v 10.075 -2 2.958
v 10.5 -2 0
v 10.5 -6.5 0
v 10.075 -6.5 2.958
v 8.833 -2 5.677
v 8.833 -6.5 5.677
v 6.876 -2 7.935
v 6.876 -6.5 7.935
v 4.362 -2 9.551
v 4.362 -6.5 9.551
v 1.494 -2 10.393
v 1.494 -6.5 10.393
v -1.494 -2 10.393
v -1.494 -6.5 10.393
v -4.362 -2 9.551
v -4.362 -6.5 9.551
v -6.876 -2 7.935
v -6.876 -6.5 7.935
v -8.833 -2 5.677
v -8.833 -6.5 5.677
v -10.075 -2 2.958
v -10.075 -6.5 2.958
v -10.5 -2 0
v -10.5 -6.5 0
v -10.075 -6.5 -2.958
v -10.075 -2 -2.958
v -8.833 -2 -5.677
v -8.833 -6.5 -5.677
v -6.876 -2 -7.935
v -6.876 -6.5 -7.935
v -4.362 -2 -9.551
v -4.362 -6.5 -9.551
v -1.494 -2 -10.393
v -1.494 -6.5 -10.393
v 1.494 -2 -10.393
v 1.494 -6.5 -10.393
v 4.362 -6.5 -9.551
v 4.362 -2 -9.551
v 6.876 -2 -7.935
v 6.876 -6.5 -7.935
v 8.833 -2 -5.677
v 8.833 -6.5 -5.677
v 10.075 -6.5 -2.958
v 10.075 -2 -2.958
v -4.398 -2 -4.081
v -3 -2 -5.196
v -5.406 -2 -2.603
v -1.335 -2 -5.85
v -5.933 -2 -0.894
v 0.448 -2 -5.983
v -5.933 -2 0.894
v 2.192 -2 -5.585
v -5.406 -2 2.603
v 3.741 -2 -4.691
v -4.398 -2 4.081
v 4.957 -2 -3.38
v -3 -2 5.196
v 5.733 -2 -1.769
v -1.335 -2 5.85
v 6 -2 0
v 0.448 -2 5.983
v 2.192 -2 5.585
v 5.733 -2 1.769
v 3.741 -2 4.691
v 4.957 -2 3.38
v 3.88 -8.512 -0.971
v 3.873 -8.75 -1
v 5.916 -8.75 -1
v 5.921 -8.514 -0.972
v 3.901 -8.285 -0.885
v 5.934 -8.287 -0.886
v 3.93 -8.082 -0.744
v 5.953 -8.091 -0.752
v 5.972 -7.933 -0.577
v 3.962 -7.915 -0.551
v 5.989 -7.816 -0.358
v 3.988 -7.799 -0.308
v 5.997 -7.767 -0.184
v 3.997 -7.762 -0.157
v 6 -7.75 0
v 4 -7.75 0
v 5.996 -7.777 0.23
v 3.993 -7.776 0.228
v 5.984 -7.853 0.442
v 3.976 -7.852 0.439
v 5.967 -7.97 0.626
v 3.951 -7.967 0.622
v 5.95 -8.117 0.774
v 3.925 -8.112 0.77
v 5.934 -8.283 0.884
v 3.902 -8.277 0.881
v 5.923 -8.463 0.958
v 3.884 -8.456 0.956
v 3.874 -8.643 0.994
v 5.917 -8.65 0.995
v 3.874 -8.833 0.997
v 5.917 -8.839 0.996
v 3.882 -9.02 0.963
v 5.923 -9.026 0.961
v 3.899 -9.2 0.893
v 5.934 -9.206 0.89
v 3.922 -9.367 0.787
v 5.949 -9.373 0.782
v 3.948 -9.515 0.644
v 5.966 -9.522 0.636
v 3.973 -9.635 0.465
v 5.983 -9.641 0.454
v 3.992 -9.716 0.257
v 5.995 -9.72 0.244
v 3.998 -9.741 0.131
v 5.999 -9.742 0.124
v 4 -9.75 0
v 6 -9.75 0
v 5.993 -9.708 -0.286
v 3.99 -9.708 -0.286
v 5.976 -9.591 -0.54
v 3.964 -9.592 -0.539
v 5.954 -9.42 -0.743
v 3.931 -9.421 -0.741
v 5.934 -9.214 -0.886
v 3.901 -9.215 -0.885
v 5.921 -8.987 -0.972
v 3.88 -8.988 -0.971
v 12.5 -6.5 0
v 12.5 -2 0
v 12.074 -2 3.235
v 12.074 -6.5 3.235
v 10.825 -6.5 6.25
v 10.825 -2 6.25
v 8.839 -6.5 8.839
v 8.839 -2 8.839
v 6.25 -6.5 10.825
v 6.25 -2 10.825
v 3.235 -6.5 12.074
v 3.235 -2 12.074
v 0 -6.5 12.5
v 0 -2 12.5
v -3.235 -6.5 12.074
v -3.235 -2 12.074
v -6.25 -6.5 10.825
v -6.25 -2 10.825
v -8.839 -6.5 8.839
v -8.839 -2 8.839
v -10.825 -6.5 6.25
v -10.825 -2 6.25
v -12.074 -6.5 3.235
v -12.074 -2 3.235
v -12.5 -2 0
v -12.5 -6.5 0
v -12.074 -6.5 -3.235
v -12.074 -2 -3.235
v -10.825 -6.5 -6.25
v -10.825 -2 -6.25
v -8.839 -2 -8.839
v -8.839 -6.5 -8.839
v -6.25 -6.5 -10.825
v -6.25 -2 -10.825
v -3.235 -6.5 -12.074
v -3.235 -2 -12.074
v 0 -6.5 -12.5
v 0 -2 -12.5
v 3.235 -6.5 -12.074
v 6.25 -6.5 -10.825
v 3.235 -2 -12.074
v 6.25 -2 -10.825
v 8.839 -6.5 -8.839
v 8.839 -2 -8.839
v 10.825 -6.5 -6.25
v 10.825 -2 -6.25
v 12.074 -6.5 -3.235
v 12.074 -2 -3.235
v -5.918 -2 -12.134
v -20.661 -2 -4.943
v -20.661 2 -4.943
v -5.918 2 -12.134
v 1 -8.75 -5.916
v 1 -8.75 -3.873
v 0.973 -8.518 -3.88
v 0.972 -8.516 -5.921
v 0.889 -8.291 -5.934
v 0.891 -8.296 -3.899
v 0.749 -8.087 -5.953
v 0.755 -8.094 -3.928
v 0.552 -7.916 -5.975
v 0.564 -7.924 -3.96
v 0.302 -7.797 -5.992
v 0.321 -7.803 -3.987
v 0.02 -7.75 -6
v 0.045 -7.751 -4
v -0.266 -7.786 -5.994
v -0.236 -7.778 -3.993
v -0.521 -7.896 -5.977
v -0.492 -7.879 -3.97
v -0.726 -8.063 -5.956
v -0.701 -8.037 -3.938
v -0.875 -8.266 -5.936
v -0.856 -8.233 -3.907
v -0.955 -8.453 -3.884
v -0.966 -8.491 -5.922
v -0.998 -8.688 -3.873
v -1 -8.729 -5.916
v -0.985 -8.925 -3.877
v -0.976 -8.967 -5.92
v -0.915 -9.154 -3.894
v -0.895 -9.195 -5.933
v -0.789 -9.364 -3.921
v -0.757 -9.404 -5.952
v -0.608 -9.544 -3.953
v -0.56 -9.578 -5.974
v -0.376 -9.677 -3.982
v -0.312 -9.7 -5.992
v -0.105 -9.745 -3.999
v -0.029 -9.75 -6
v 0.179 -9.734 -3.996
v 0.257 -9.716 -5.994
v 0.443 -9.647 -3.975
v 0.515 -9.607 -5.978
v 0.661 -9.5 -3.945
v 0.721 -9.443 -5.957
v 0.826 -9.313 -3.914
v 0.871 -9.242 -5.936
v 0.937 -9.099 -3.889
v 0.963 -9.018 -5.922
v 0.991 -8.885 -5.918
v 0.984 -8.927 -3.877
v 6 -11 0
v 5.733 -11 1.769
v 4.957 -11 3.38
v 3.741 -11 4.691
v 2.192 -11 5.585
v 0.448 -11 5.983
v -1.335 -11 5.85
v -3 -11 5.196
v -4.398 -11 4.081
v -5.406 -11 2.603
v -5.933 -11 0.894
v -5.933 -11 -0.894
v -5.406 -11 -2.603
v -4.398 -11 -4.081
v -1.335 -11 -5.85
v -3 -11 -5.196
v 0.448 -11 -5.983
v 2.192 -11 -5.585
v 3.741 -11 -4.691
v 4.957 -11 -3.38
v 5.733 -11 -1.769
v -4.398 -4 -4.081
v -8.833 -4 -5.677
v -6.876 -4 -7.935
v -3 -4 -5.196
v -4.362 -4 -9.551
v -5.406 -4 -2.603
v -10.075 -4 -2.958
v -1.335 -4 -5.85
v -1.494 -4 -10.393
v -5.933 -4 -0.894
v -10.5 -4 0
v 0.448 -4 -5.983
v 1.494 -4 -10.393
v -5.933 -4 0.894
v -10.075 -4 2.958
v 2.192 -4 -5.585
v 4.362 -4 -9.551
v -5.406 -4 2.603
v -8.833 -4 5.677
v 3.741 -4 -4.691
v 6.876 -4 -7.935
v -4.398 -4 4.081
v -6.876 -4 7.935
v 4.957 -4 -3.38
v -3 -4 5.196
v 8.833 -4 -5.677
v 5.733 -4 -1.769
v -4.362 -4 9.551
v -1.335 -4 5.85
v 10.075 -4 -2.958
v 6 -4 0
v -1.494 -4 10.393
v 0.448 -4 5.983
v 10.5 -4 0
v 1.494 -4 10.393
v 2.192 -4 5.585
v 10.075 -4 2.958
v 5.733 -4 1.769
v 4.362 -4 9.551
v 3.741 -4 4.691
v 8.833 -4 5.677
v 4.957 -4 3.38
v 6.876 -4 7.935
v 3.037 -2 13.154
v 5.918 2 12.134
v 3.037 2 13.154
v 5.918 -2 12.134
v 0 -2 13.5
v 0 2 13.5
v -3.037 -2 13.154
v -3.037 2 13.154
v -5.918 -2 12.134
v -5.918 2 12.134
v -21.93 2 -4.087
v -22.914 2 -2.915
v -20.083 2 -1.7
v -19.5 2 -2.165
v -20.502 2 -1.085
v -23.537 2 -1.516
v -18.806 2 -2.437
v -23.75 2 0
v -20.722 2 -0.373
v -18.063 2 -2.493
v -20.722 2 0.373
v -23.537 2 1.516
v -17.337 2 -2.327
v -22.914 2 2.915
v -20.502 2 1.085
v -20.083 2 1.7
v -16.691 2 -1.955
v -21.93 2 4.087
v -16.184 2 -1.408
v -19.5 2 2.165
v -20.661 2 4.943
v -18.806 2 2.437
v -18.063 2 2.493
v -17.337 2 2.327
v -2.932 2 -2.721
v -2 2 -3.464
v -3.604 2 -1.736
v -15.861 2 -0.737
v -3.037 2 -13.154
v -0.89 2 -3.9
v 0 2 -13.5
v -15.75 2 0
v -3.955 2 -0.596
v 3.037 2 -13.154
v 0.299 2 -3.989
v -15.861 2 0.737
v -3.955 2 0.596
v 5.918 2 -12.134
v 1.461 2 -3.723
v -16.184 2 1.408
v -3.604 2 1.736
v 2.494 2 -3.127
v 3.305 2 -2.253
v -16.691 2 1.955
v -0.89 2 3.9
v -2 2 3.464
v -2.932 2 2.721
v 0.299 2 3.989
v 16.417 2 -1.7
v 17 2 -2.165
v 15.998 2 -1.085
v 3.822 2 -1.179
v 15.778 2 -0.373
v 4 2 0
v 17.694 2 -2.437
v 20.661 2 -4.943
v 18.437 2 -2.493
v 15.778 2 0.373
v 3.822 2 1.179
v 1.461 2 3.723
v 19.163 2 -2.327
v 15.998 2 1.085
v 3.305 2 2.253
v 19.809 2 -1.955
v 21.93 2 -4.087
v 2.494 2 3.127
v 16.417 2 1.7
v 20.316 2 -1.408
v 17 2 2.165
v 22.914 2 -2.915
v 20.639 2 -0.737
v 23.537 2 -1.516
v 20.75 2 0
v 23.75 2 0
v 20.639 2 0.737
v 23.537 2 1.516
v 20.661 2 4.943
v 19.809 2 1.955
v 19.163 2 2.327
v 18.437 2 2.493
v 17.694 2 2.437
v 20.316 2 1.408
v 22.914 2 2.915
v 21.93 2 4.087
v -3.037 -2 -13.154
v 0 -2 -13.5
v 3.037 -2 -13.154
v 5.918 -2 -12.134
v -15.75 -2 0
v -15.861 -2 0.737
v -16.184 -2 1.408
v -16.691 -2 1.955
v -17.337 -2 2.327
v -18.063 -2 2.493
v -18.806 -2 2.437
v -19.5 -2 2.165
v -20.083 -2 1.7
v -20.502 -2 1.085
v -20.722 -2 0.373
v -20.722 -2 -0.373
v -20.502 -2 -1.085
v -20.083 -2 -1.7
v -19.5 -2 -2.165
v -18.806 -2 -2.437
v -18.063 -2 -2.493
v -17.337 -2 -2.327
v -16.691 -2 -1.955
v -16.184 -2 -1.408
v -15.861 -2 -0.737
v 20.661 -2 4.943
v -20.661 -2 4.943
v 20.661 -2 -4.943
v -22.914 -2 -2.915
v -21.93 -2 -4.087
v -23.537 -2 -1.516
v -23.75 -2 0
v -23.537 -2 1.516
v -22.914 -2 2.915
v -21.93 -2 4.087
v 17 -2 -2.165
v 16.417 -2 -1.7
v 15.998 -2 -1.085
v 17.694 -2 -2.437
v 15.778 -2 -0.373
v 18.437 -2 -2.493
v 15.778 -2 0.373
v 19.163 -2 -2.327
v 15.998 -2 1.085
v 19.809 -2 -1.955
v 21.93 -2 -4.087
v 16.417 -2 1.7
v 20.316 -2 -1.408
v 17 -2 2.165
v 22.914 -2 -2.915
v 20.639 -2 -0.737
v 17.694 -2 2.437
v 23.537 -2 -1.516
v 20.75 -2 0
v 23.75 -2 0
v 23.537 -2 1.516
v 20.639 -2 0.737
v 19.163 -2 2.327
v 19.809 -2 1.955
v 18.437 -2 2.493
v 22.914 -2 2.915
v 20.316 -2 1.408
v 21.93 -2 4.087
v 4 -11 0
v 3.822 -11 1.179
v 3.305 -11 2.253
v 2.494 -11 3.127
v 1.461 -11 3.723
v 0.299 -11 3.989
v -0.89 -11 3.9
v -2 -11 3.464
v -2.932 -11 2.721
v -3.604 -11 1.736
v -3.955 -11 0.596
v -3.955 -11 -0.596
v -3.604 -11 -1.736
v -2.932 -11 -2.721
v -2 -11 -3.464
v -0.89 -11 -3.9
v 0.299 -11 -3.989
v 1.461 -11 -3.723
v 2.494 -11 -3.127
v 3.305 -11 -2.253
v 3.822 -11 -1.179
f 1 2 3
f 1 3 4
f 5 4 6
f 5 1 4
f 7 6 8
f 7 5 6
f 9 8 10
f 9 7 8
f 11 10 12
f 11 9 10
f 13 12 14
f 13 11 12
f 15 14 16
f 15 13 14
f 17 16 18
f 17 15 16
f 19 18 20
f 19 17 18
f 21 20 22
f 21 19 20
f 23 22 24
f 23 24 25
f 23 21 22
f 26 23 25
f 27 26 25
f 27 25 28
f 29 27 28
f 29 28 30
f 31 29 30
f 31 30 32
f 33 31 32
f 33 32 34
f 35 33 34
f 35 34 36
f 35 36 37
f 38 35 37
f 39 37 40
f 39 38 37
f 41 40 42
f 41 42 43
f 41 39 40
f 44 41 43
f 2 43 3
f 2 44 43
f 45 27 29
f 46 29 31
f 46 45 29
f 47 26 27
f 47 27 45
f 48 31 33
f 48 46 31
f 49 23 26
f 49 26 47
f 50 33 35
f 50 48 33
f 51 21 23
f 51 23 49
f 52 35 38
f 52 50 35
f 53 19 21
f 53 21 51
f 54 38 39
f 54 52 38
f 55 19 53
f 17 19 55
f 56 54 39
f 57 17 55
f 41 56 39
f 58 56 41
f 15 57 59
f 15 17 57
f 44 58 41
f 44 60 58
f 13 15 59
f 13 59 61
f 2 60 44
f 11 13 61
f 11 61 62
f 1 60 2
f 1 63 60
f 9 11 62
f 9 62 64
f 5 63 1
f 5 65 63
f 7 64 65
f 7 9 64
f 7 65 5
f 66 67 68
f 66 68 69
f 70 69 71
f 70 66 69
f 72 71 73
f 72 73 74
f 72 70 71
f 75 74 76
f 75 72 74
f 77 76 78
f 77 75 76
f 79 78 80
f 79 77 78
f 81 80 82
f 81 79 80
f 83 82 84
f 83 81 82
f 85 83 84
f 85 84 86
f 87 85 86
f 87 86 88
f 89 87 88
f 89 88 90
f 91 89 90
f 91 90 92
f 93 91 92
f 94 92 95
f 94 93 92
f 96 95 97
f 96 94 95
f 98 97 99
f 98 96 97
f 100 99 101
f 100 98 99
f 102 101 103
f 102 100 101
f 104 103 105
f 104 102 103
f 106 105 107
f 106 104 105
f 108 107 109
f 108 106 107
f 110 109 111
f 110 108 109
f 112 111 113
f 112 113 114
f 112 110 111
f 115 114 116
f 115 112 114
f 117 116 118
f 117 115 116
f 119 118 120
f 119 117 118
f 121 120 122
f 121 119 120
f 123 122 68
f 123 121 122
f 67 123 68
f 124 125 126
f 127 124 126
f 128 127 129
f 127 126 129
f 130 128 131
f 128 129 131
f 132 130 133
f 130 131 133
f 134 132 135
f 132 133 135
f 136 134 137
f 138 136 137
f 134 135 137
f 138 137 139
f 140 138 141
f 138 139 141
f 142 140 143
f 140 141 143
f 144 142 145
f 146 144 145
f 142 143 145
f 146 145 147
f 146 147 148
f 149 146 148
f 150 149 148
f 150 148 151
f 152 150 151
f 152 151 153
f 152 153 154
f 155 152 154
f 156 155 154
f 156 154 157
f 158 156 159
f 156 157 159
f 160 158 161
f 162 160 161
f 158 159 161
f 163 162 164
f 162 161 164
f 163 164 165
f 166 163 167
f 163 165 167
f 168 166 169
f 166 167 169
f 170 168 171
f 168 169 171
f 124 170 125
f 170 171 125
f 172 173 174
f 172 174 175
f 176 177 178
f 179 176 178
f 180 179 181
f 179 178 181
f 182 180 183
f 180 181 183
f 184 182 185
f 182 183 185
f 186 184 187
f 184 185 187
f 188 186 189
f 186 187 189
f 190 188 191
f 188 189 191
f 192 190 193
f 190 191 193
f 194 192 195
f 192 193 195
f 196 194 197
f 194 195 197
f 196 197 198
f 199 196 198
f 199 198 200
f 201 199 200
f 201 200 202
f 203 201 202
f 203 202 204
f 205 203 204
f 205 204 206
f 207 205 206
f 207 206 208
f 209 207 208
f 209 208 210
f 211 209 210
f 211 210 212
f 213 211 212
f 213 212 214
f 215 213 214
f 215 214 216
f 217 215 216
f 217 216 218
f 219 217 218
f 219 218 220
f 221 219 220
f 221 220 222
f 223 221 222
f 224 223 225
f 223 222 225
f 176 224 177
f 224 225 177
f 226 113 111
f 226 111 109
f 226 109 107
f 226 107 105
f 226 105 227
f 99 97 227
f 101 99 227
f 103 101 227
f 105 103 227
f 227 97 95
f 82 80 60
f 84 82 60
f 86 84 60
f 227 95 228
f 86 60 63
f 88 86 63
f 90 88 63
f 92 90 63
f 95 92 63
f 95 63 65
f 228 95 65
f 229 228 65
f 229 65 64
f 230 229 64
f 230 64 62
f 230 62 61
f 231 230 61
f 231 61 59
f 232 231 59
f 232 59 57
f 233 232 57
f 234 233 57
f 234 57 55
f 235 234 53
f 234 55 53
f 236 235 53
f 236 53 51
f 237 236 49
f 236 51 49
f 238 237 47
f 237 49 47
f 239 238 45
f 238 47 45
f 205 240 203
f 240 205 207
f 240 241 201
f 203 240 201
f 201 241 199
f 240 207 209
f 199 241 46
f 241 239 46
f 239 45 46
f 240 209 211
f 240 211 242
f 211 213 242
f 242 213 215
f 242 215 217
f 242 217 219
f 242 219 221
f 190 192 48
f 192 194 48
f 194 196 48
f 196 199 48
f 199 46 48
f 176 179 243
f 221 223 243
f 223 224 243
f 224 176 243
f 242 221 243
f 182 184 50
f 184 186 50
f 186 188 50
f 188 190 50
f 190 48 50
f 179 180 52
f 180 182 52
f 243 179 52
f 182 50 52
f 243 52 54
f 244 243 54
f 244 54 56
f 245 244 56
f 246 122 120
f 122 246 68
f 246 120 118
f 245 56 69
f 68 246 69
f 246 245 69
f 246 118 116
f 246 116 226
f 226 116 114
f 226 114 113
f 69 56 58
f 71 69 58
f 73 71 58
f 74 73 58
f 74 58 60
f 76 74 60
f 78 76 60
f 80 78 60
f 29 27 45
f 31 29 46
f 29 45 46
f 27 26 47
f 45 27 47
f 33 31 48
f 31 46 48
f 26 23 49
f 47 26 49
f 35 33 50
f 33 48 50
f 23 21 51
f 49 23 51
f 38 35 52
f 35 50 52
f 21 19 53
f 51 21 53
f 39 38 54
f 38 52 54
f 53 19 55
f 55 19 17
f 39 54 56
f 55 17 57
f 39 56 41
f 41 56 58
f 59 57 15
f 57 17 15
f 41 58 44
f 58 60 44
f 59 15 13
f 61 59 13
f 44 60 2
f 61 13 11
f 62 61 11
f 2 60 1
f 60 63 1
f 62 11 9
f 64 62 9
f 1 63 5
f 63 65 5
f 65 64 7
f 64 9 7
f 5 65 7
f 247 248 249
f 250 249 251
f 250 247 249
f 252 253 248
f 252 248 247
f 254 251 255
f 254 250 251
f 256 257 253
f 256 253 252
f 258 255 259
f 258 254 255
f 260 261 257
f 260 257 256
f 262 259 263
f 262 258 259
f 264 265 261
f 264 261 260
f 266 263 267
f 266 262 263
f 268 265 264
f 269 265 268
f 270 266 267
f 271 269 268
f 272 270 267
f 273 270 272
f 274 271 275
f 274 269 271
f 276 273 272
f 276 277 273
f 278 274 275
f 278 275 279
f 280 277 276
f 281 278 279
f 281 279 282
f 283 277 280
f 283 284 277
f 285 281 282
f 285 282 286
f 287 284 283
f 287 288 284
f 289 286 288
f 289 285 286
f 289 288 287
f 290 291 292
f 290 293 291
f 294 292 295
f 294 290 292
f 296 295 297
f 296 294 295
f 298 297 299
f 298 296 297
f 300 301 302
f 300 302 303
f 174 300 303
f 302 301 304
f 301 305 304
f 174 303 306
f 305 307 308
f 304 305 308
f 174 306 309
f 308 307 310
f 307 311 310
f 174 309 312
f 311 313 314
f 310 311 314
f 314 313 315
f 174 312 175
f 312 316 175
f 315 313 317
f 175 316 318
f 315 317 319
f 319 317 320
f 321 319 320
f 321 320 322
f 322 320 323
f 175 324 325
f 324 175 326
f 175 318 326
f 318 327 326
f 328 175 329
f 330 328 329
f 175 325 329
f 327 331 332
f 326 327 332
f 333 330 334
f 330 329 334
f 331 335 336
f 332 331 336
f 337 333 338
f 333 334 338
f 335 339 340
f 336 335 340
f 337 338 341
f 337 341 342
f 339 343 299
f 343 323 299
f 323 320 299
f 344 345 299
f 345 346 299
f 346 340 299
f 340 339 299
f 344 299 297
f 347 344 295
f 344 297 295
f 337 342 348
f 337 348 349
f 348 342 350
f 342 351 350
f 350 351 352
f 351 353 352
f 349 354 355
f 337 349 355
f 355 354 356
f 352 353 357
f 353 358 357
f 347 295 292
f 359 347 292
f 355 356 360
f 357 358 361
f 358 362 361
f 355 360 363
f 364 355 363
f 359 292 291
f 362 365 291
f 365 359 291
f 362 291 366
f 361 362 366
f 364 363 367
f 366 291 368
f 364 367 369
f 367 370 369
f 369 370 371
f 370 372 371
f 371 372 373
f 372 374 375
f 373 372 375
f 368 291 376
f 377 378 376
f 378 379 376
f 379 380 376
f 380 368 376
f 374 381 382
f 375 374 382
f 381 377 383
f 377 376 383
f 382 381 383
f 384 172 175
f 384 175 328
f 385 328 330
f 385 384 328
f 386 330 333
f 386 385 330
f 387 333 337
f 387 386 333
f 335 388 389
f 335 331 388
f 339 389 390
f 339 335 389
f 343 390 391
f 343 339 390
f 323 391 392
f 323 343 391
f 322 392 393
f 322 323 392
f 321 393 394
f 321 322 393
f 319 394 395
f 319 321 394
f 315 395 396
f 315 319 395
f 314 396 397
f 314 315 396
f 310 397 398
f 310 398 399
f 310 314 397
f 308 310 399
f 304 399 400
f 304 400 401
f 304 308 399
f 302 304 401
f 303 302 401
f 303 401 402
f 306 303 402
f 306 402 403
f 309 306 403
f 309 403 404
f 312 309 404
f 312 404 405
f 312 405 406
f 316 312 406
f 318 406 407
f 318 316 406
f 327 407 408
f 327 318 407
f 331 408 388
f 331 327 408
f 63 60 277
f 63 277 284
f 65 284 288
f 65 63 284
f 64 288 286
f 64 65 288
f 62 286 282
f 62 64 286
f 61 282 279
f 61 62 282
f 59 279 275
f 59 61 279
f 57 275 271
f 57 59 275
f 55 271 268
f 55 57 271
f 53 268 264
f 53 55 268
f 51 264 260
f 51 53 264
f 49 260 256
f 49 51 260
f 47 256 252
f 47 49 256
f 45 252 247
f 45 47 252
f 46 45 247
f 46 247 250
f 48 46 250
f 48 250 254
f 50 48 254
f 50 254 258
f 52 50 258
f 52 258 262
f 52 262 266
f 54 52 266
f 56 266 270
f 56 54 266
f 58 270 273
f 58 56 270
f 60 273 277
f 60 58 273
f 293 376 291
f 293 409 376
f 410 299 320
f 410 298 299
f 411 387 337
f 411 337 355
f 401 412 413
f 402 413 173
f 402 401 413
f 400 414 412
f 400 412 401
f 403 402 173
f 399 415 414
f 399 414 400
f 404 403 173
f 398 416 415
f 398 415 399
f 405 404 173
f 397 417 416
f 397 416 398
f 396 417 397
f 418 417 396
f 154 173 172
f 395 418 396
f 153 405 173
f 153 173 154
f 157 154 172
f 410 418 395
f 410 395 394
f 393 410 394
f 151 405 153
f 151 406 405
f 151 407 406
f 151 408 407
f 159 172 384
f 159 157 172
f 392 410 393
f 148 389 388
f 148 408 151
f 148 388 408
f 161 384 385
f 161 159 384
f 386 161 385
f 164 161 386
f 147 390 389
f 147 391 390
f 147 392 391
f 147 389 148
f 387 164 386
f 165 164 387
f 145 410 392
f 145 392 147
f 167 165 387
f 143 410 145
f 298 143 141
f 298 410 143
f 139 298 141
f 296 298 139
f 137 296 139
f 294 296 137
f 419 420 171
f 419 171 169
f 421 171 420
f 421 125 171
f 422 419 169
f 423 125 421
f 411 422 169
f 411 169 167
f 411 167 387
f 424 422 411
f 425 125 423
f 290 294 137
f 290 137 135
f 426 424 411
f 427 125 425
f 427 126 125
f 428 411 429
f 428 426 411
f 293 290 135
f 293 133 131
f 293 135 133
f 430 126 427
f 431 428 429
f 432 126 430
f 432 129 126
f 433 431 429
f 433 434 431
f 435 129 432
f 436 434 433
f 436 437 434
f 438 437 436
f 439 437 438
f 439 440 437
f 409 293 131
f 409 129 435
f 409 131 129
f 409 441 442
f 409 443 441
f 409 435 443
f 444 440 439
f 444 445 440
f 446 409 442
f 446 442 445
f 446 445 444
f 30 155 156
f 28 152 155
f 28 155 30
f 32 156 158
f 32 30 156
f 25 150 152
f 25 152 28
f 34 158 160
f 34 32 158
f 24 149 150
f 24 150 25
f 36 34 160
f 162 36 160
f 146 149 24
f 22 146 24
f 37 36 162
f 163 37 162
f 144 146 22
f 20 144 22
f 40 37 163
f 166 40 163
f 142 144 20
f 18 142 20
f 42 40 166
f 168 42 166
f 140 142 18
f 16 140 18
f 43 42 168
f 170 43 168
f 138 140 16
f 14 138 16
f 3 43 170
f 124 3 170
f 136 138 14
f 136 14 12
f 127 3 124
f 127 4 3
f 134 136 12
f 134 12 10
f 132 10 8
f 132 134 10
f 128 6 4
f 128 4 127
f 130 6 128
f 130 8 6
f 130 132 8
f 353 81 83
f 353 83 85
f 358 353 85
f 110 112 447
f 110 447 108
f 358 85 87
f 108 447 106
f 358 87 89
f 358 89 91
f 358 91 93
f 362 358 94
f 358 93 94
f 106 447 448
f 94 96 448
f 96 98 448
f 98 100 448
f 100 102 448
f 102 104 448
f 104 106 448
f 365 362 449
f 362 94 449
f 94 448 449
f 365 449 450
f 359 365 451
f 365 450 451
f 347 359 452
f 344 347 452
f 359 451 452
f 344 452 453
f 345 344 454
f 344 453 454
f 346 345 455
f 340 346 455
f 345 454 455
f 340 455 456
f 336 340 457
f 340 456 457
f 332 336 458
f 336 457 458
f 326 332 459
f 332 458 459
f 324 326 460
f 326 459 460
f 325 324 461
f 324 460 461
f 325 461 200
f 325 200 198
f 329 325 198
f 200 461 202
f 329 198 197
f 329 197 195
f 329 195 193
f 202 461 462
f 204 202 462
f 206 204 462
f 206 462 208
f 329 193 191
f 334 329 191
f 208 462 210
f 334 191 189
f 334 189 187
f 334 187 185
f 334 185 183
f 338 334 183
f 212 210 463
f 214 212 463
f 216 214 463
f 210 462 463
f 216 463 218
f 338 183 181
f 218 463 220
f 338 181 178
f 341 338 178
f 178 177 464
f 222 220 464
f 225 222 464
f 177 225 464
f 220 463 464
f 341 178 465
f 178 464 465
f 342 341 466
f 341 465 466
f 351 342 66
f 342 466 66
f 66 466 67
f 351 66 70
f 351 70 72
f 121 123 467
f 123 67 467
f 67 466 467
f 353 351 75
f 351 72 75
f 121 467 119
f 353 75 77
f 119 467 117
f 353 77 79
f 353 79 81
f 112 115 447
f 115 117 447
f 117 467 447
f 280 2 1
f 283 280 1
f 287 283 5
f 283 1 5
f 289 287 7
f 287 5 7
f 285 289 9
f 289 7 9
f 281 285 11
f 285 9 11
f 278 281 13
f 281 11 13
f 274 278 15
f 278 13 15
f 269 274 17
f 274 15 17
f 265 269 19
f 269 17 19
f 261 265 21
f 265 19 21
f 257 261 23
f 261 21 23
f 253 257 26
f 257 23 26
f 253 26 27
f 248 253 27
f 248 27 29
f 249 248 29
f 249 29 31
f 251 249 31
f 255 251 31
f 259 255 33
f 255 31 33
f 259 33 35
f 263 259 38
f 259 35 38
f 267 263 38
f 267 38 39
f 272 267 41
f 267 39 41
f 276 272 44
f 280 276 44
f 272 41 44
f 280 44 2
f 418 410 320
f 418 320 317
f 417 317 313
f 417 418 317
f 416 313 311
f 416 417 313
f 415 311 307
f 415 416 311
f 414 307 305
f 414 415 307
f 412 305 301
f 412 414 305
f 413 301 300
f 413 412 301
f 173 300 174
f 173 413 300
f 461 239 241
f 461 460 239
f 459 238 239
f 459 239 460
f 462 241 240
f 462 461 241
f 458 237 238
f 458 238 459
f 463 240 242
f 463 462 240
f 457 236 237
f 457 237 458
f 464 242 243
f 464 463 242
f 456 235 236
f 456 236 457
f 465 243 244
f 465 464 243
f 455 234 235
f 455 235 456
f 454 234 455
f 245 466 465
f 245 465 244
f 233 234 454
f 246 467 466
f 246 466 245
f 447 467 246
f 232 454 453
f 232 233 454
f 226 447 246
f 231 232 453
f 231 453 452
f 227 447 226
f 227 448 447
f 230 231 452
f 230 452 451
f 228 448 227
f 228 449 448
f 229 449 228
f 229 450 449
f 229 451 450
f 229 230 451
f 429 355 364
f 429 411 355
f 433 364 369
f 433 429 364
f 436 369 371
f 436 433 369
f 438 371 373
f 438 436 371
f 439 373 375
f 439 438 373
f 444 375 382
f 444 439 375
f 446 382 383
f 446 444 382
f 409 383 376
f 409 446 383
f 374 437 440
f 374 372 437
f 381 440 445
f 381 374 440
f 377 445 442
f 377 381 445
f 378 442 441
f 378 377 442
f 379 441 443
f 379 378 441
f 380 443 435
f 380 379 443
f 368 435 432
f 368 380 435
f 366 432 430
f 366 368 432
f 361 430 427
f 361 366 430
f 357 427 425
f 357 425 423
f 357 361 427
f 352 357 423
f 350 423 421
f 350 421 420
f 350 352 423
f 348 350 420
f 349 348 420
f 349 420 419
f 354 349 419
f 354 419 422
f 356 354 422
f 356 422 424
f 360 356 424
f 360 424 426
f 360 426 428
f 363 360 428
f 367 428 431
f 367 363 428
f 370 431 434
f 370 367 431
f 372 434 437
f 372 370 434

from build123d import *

# Parameters (mm, degrees)
F0_R     = 2.5
F1_DEPTH = 2
F2_R     = 12.5
F2_R_2   = 10.5
F3_DEPTH = 4.5
F4_R     = 6
F4_R_2   = 4
F5_DEPTH = 9
F6_DEPTH = 4.001
F7_DEPTH = 2
F8_R     = 1
F9_DEPTH = 13.501


# Not quite as in the source:
# - a pattern or mirror of a feature is missing from the dataset's text; its kind, count and spacing are read off the source's solid


with BuildPart() as f1:
    # F0 (on Front) → F1 (new body, symmetric)
    with BuildSketch(Plane.XZ):
        with BuildLine():
            Line((-5.9178082192, 12.133818273), (-20.6609589041, 4.9434074445))
            ThreePointArc((-20.6609589041, 4.9434074445), (-23.75, 0), (-20.6609589041, -4.9434074445))
            Line((-20.6609589041, -4.9434074445), (-5.9178082192, -12.133818273))
            ThreePointArc((-5.9178082192, -12.133818273), (0, -13.5), (5.9178082192, -12.133818273))
            Line((5.9178082192, -12.133818273), (20.6609589041, -4.9434074445))
            ThreePointArc((20.6609589041, -4.9434074445), (23.75, 0), (20.6609589041, 4.9434074445))
            Line((20.6609589041, 4.9434074445), (5.9178082192, 12.133818273))
            ThreePointArc((5.9178082192, 12.133818273), (0, 13.5), (-5.9178082192, 12.133818273))
        make_face()
        with Locations((-18.25, 0)):
            Circle(F0_R, mode=Mode.SUBTRACT)
        with Locations((18.25, 0)):
            Circle(F0_R, mode=Mode.SUBTRACT)
    extrude(amount=F1_DEPTH, both=True)

    # F2 (on face) → F3 (join)
    with BuildSketch(Plane.XZ.offset(2)):
        Circle(F2_R)
        Circle(F2_R_2, mode=Mode.SUBTRACT)
    extrude(amount=F3_DEPTH)

    # F4 (on face) → F5 (join)
    with BuildSketch(Plane.XZ.offset(2)):
        Circle(F4_R)
        Circle(F4_R_2, mode=Mode.SUBTRACT)
    extrude(amount=F5_DEPTH)

    # F4 (on face) → F6 (cut, through all)
    with BuildSketch(Plane.XZ.offset(2)):
        Circle(F4_R_2)
    extrude(amount=-F6_DEPTH, mode=Mode.SUBTRACT)


with BuildPart() as f7:
    # F7 (new): a face of the model
    f7_faces = [f1.part.faces().sort_by_distance(p)[0] for p in [
        (-10.2030151519, -2, 0),
    ]]
    extrude(f7_faces, amount=F7_DEPTH)


with BuildPart() as f1_1:
    add(f1.part)

    # F8 (on Top) → F9 (cut, through all)
    with BuildSketch(Plane.XY):
        with Locations((0, -8.75)):
            Circle(F8_R)
    f9 = extrude(amount=-F9_DEPTH, mode=Mode.SUBTRACT)

    # F9_copies: F9 across plane
    add(f9.mirror(Plane(origin=(0, 0, 0), x_dir=(-0.7071067098, 0, 0.7071068526), z_dir=(0.7071068526, 2.218e-07, 0.7071067098))), mode=Mode.SUBTRACT)


solid = Compound([f7.part, f1_1.part])
